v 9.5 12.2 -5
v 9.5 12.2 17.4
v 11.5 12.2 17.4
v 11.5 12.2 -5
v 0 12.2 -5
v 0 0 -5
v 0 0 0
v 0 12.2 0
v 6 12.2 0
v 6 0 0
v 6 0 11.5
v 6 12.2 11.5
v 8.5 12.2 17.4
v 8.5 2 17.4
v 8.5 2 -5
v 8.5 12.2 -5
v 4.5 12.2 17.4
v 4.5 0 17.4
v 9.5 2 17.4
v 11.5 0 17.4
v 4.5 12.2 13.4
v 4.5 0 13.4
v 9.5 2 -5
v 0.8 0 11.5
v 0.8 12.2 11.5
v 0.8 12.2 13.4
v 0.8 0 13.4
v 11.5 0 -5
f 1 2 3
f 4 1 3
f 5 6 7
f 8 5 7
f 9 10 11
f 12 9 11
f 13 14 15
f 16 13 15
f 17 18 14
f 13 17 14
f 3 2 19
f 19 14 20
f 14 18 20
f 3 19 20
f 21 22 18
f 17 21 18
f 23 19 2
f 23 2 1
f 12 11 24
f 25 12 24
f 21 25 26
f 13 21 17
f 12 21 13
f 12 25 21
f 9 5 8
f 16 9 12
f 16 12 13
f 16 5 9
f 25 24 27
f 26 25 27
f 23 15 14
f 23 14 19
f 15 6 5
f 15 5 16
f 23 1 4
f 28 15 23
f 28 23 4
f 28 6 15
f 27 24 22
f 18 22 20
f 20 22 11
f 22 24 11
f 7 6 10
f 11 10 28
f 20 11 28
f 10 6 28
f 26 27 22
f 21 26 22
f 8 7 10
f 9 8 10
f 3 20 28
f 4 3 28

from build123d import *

# Parameters (mm, degrees)
BOSS_EXTRUDE1_DEPTH   = 12.2
SKETCH1_W             = 2
SKETCH1_H             = 22.4
BOSS_EXTRUDE1_2_DEPTH = 12.2
SKETCH1_4_W           = 1
SKETCH1_4_H           = 22.4
BOSS_EXTRUDE2_DEPTH   = 2


with BuildPart() as part:
    # Sketch1 → Boss-Extrude1 (new body)
    with BuildSketch(Plane(origin=(0, 0, 0), x_dir=(1, 0, 0), z_dir=(0, 1, 0))):
        Polygon((0, 5), (0, 0), (6, 0), (6, -11.5), (0.8, -11.5), (0.8, -13.4), (4.5, -13.4), (4.5, -17.4), (8.5, -17.4), (8.5, 5), align=None)
    extrude(amount=BOSS_EXTRUDE1_DEPTH)



with BuildPart() as body_2:
    # Sketch1 → Boss-Extrude1 2 (new body)
    with BuildSketch(Plane(origin=(0, 0, 0), x_dir=(1, 0, 0), z_dir=(0, 1, 0))):
        with Locations((10.5, -6.2)):
            Rectangle(SKETCH1_W, SKETCH1_H)
    extrude(amount=BOSS_EXTRUDE1_2_DEPTH)


with BuildPart() as part_1:
    add(part.part)

    add(body_2.part)  # Boss-Extrude2 merges body 2
    # Sketch1<4> → Boss-Extrude2 (add)
    with BuildSketch(Plane(origin=(0, 0, 0), x_dir=(1, 0, 0), z_dir=(0, 1, 0))):
        with Locations((9, -6.2)):
            Rectangle(SKETCH1_4_W, SKETCH1_4_H)
    extrude(amount=BOSS_EXTRUDE2_DEPTH)


solid = part_1.part
